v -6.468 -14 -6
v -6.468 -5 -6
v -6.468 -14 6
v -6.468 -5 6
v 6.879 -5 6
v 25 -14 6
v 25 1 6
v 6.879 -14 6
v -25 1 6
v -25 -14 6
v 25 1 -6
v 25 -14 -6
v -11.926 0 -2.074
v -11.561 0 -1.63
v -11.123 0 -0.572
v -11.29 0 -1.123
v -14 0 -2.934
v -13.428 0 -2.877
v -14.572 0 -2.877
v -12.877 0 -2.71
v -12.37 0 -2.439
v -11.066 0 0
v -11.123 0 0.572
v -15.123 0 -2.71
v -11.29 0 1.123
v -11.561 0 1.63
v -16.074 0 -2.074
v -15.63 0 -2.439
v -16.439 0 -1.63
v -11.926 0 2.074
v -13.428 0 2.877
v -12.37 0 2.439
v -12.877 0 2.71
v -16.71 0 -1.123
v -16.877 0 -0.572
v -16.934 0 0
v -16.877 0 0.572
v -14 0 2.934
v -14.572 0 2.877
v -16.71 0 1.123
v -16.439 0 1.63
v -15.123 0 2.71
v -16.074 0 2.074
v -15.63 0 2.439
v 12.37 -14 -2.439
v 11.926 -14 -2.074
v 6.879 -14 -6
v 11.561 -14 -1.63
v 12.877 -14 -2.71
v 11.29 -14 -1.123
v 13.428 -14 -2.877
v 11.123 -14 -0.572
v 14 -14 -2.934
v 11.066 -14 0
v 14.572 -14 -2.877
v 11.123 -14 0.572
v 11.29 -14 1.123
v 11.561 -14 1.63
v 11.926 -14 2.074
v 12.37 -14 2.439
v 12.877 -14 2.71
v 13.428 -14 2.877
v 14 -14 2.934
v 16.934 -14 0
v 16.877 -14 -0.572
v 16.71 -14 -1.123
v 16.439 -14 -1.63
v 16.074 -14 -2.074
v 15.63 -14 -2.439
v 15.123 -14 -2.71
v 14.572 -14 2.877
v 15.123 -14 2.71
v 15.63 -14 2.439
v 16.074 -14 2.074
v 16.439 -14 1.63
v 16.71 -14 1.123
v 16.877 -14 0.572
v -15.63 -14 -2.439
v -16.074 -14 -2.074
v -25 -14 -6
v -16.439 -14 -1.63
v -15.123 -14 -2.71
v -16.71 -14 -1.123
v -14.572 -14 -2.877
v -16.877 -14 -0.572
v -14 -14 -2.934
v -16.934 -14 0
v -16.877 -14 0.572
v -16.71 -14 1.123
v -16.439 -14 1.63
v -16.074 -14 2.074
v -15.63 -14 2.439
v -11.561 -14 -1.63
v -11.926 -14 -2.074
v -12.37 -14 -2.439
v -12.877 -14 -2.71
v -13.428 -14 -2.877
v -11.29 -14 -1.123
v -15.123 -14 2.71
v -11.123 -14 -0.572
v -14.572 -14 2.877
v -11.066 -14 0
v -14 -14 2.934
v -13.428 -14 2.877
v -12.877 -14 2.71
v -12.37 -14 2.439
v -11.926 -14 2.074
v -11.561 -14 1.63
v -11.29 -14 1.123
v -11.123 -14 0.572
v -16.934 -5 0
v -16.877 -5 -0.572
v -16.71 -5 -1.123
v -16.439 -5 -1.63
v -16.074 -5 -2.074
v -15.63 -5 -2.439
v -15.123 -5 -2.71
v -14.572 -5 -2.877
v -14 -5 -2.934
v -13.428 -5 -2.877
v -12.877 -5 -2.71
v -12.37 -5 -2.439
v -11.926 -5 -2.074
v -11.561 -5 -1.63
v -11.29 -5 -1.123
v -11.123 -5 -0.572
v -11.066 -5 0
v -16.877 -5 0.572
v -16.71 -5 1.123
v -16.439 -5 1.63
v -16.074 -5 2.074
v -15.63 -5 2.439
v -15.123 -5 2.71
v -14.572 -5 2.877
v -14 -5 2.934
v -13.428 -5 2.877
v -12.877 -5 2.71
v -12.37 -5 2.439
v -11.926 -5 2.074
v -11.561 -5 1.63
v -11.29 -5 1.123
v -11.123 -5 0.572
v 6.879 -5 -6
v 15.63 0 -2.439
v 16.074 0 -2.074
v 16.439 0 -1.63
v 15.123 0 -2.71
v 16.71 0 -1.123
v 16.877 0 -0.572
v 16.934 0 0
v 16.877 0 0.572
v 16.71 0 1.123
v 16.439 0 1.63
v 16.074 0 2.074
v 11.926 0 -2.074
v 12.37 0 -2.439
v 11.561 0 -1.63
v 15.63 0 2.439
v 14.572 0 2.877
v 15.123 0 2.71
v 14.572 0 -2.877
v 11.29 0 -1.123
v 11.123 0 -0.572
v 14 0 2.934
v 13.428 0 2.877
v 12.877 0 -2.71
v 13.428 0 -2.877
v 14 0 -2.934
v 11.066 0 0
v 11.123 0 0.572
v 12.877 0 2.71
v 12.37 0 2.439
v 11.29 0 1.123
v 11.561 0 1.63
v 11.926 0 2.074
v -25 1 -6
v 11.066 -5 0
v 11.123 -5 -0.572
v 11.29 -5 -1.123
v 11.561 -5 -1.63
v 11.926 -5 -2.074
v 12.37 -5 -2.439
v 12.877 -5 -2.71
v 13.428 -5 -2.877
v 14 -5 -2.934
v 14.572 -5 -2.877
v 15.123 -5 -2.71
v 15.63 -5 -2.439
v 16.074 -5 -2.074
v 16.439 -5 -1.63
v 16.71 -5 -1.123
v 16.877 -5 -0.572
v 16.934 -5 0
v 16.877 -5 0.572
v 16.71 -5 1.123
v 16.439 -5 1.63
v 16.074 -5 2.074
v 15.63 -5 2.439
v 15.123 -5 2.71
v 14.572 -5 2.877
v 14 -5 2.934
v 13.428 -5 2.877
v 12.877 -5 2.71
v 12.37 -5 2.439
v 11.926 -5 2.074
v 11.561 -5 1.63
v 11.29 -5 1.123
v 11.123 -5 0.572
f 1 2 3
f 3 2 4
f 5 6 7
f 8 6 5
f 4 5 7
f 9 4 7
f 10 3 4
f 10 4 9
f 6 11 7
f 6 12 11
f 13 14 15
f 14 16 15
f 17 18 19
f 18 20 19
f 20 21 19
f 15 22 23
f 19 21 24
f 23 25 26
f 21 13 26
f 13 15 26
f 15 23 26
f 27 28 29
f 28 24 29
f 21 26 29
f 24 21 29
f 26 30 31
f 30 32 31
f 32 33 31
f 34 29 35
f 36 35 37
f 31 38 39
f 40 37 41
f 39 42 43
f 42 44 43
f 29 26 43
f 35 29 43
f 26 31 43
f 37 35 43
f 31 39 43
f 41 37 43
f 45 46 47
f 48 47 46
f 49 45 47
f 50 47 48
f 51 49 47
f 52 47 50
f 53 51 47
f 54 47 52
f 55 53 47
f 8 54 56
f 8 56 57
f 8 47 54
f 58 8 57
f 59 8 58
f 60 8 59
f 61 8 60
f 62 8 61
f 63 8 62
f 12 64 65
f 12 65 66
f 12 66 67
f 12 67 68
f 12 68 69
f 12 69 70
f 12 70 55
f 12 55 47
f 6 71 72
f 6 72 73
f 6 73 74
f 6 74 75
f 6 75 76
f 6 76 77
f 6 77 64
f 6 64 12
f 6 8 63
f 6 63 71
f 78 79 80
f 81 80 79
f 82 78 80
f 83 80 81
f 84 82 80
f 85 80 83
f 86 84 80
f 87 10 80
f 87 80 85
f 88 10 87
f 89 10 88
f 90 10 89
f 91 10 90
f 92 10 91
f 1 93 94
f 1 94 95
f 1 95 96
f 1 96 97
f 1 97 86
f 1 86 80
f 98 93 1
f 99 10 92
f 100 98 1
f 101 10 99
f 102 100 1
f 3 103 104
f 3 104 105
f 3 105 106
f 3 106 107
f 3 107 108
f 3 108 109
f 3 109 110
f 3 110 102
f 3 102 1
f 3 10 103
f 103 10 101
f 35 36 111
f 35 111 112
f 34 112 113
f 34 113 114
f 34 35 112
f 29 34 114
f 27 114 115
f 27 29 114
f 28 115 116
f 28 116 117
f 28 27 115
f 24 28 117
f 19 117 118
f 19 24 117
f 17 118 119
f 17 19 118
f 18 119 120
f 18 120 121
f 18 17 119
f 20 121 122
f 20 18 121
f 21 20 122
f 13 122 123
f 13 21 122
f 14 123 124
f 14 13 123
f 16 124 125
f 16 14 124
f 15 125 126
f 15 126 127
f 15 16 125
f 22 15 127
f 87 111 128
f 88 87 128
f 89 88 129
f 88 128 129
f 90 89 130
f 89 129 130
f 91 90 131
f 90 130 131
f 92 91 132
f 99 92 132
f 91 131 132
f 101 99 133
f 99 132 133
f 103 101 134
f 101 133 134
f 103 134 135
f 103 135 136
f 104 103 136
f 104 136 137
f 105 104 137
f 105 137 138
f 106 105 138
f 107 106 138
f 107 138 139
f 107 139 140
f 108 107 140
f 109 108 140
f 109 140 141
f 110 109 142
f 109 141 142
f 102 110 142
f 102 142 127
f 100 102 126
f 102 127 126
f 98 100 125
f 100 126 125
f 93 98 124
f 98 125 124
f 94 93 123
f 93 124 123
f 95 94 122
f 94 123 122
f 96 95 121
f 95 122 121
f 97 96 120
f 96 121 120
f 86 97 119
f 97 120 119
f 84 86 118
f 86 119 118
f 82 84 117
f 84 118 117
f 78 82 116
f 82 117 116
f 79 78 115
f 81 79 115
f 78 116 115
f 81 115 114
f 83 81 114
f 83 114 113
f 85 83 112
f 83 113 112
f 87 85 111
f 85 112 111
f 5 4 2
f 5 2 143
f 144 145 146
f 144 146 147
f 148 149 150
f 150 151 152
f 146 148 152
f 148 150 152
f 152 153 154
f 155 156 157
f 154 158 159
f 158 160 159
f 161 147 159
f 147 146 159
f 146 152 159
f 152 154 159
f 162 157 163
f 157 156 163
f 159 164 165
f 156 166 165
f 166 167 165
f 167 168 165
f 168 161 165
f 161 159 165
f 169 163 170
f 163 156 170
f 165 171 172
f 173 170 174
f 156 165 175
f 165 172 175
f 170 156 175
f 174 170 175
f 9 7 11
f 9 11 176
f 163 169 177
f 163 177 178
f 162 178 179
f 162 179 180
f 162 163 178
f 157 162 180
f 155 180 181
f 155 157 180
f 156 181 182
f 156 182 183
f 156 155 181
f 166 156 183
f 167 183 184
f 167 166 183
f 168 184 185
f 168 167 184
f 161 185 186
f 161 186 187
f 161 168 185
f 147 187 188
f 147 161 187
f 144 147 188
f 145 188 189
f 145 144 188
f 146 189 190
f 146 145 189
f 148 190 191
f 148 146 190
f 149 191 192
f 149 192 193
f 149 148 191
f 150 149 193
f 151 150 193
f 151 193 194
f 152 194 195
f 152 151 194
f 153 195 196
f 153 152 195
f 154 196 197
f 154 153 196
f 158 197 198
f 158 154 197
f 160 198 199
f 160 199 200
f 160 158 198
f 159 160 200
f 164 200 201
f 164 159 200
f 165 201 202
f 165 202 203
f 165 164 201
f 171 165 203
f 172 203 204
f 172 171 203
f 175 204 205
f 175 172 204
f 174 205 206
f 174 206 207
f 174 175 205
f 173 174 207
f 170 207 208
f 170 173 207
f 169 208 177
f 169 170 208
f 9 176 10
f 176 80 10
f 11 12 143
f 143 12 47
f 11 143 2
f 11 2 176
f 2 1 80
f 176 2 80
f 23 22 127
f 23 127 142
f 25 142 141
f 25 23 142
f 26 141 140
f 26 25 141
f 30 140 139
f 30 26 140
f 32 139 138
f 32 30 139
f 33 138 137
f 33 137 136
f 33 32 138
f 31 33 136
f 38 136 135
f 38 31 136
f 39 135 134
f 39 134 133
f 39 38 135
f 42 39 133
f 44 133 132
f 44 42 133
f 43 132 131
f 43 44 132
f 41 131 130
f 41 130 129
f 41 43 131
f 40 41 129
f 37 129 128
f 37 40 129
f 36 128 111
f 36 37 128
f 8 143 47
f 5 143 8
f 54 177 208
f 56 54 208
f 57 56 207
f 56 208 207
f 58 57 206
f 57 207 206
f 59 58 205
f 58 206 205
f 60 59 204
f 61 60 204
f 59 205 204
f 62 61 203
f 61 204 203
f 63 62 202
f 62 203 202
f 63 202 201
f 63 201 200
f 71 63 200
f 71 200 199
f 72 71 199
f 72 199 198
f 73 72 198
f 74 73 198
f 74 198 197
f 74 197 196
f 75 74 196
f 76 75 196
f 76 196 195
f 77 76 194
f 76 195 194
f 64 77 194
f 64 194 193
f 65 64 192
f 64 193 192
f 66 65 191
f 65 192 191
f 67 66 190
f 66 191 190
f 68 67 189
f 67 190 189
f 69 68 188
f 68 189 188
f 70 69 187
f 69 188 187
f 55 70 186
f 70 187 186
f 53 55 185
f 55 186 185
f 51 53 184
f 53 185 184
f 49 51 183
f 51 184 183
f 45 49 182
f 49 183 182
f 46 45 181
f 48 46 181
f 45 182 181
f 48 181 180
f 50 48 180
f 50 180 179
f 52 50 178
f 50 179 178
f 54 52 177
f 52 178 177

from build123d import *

# Parameters (mm, degrees)
F0_W     = 50
F0_H     = 12
F0_R     = 2.9335
F1_DEPTH = 5
F2_W     = 18.531616
F2_H     = 12
F2_W_2   = 18.120926
F3_DEPTH = 9
F4_R     = 2.9335
F5_DEPTH = 25
F6_W     = 50
F6_H     = 12
F7_DEPTH = 1


with BuildPart() as f1:
    # F0 (on Front) → F1 (new body)
    with BuildSketch(Plane.XZ):
        Rectangle(F0_W, F0_H)
        with Locations((-14, 0)):
            Circle(F0_R, mode=Mode.SUBTRACT)
        with Locations((14, 0)):
            Circle(F0_R, mode=Mode.SUBTRACT)
    extrude(amount=F1_DEPTH)

    # F2 (on face) → F3 (join)
    with BuildSketch(Plane.XZ.offset(5)):
        with Locations((-15.734192, 0)):
            Rectangle(F2_W, F2_H)
        with Locations((15.939537, 0)):
            Rectangle(F2_W_2, F2_H)
    extrude(amount=F3_DEPTH)

    # F4 (on face) → F5 (cut)
    with BuildSketch(Plane(origin=(0, 0, 0), x_dir=(-1, 0, 0), z_dir=(0, 1, 0))):
        with Locations((-14, 0)):
            Circle(F4_R)
        with Locations((14, 0)):
            Circle(F4_R)
    extrude(amount=-F5_DEPTH, mode=Mode.SUBTRACT)

    # F6 (on face) → F7 (join)
    with BuildSketch(Plane(origin=(0, 0, 0), x_dir=(-1, 0, 0), z_dir=(0, 1, 0))):
        Rectangle(F6_W, F6_H)
    extrude(amount=F7_DEPTH)


solid = f1.part
